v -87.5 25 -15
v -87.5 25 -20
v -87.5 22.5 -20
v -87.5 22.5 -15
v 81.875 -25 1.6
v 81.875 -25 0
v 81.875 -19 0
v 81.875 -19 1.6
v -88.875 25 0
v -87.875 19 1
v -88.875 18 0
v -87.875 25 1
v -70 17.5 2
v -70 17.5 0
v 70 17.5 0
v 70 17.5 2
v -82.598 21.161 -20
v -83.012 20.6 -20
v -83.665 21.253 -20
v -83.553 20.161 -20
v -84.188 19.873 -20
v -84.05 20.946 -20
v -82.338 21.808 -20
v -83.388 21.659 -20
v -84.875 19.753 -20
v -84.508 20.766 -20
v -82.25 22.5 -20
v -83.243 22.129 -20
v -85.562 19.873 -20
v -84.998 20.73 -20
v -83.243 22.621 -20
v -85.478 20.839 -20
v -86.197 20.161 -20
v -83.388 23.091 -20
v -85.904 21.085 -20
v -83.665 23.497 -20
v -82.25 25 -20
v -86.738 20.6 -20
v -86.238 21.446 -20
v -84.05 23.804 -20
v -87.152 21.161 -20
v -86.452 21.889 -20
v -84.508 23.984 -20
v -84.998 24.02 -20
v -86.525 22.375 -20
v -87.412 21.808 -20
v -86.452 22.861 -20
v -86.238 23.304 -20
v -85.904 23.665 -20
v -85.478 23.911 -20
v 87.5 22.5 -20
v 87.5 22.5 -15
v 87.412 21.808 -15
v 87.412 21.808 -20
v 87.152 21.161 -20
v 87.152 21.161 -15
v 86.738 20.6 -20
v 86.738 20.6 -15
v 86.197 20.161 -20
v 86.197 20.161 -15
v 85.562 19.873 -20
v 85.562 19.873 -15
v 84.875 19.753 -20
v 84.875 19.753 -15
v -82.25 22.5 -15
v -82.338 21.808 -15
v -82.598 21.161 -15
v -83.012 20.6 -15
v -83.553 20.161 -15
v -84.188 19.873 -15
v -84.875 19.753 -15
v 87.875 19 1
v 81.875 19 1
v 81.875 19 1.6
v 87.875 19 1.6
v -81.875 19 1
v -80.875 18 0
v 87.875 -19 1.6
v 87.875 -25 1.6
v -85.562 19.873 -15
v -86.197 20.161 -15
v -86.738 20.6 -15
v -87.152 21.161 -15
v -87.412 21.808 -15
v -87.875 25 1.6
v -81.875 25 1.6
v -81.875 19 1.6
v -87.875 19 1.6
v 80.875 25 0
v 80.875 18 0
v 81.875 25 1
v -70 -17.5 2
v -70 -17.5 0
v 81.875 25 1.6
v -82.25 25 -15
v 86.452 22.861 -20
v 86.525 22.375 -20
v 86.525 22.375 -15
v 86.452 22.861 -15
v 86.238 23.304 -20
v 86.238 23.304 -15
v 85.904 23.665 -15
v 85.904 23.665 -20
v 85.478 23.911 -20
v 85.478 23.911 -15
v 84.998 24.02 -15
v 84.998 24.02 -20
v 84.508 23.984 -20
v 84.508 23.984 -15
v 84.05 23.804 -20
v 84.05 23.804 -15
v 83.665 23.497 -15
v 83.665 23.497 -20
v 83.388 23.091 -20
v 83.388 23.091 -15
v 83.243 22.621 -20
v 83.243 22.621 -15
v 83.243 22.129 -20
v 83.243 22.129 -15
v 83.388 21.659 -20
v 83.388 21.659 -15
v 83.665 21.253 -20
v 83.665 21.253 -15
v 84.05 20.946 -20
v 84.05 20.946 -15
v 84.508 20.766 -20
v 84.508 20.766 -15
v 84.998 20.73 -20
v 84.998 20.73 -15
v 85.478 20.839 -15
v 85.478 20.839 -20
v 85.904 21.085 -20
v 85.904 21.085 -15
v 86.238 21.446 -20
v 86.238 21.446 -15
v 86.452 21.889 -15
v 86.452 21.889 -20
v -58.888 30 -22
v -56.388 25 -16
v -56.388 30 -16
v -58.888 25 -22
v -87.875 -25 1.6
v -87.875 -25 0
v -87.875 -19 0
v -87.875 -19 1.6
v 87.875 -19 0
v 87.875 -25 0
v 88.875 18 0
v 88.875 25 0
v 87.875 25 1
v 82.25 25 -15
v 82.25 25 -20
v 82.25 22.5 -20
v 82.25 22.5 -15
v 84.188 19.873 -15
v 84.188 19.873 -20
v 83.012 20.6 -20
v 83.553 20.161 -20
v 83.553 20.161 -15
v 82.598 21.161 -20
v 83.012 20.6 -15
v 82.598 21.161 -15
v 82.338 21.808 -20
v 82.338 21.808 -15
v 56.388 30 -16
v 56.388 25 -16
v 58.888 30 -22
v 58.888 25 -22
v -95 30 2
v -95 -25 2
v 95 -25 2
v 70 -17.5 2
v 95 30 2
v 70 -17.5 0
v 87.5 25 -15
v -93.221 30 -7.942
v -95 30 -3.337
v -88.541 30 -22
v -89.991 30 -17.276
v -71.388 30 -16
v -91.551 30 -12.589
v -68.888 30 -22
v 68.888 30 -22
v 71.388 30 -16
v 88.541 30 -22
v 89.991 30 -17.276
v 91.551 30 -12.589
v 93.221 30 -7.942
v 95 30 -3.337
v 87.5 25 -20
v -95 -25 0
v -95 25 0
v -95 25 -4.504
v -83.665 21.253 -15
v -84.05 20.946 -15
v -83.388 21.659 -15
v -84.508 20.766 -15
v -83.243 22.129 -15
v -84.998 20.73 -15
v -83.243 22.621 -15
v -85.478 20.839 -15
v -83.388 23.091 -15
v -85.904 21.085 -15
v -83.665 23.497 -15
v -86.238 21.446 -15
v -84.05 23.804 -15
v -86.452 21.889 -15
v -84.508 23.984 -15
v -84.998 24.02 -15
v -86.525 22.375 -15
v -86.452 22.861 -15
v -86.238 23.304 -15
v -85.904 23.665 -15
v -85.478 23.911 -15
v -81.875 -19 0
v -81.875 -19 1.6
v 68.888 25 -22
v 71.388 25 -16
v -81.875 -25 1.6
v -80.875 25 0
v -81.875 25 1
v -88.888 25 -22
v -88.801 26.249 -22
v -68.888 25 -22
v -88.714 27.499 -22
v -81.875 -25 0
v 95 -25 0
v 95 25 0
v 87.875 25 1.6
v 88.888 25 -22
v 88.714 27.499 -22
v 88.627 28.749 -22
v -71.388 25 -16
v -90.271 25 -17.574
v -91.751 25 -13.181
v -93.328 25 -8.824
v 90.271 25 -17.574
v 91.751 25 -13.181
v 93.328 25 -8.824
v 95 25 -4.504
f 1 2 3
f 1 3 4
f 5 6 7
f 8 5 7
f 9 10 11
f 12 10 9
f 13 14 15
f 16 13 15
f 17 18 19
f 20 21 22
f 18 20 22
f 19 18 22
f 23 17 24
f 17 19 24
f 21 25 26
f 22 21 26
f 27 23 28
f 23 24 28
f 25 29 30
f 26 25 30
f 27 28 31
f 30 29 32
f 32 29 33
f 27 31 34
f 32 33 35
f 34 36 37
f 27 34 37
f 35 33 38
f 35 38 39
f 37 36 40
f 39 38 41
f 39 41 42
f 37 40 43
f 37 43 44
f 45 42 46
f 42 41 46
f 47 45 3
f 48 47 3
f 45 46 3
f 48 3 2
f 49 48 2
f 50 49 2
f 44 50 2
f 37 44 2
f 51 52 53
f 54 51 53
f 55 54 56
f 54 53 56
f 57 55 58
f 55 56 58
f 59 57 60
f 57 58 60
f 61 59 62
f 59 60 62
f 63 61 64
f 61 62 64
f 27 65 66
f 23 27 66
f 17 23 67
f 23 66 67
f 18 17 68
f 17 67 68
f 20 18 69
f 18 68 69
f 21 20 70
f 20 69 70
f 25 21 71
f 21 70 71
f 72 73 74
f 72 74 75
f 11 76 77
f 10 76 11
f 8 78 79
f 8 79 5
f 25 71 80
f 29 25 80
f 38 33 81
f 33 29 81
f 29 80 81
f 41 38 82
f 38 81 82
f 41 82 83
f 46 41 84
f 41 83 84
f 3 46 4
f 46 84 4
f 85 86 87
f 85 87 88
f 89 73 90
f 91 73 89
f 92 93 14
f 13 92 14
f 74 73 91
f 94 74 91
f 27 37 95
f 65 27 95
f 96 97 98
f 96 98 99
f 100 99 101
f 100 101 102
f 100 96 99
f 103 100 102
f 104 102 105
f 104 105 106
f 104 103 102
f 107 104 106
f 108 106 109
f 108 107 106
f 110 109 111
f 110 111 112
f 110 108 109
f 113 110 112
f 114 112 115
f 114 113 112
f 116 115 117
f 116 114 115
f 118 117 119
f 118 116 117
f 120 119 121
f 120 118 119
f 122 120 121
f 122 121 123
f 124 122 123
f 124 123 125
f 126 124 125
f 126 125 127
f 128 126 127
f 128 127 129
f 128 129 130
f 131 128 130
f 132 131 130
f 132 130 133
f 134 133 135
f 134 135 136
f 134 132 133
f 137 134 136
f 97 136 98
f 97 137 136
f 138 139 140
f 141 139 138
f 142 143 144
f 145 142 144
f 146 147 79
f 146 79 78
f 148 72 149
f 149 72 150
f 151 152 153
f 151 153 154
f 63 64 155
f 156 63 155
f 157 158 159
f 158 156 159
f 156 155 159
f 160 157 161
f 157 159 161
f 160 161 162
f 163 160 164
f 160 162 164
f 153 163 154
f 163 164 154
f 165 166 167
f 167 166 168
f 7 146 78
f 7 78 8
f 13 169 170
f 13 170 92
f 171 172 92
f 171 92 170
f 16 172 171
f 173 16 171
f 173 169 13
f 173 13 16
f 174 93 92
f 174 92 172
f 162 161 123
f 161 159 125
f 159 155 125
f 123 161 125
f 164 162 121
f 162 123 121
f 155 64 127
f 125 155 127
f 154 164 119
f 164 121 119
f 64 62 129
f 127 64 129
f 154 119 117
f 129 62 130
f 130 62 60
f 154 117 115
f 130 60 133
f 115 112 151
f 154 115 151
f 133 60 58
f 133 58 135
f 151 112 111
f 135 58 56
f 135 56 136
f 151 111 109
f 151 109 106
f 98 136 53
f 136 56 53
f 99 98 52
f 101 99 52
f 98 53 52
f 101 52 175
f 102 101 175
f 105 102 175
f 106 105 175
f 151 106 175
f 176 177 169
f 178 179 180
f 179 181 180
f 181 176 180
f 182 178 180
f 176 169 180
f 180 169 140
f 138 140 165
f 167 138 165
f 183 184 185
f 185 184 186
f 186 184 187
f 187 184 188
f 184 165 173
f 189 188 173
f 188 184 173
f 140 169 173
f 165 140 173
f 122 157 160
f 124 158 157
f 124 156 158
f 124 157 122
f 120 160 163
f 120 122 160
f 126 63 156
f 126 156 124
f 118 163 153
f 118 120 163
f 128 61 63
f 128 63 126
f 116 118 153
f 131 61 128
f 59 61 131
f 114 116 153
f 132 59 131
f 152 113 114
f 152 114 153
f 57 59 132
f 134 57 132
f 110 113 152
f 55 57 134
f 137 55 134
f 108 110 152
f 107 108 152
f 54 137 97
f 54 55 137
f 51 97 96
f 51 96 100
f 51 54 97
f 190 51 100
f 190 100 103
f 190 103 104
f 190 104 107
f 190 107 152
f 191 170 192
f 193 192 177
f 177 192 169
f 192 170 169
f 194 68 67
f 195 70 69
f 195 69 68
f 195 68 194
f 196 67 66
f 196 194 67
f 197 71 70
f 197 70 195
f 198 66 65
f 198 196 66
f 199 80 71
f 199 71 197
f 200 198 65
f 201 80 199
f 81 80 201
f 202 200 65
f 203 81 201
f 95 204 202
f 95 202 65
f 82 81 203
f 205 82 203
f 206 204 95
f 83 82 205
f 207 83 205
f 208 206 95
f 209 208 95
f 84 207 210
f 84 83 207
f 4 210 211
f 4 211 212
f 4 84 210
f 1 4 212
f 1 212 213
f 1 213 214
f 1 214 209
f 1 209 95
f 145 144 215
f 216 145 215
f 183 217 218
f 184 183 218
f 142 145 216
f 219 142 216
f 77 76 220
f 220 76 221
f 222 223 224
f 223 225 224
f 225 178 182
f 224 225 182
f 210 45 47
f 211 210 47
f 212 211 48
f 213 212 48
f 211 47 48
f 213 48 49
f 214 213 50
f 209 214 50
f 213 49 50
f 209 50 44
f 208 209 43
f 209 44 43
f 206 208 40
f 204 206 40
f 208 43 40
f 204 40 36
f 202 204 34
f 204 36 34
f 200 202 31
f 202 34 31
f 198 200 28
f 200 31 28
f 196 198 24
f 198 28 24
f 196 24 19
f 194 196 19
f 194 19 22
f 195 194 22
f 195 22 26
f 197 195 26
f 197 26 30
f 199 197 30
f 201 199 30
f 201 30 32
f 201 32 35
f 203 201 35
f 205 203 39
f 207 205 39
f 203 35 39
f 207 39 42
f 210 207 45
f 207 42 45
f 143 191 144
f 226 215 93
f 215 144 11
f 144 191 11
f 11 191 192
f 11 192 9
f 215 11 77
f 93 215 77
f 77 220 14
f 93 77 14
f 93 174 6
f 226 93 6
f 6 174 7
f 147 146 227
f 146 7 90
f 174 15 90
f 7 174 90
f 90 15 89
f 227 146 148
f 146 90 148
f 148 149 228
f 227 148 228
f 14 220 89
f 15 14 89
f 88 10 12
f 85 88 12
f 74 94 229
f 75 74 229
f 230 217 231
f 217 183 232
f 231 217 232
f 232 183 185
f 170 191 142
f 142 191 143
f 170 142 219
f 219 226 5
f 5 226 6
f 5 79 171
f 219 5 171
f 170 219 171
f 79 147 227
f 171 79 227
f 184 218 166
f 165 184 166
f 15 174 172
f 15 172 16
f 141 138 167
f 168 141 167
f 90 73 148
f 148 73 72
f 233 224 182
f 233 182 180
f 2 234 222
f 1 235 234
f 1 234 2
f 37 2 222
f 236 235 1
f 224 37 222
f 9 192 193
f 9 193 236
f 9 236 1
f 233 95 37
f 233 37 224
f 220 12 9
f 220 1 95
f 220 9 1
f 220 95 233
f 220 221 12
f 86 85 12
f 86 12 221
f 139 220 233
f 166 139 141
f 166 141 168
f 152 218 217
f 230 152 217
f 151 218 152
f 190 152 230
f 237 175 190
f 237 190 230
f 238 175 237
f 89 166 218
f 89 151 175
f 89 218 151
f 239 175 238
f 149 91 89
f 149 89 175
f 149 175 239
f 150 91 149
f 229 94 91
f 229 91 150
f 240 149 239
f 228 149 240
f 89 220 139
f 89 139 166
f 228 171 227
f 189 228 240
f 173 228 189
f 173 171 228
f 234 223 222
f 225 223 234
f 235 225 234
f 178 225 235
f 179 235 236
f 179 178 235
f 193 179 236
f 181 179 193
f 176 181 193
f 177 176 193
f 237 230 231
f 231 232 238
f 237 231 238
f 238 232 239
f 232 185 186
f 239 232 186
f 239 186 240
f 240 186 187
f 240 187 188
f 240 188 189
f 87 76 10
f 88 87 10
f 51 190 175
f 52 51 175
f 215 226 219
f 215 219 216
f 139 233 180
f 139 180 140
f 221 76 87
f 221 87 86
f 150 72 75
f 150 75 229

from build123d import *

# Parameters (mm, degrees)
SKETCH1_W                = 190
SKETCH1_H                = 50
SKETCH1_W_2              = 140
SKETCH1_H_2              = 35
BOSS_EXTRUDE1_DEPTH      = 2
SKETCH3_W                = 190
SKETCH3_H                = 5
BOSS_EXTRUDE2_DEPTH      = 24
BOSS_EXTRUDE3_START      = -7.5
SKETCH6_W                = 5
SKETCH6_H                = 5.25
BOSS_EXTRUDE3_DEPTH      = 5.25
CUT_EXTRUDE1_DEPTH       = 108.905945309
SKETCH7_R                = 1.65
CUT_EXTRUDE2_DEPTH       = 5
FILLET1_R                = 2.75
FILLET1_OF_MIRROR3_R     = 2.75
CUT_EXTRUDE3_DEPTH       = 5
SKETCH10_W               = 6
SKETCH10_H               = 6
CUT_EXTRUDE4_DEPTH       = 1.6
CHAMFER1_SIZE            = 1
SKETCH12_W               = 6
SKETCH12_H               = 6
CUT_EXTRUDE5_DEPTH       = 1.6
CHAMFER1_OF_MIRROR5_SIZE = 1


with BuildPart() as part:
    # Sketch1 → Boss-Extrude1 (new body)
    with BuildSketch(Plane.XY):
        Rectangle(SKETCH1_W, SKETCH1_H)
        Rectangle(SKETCH1_W_2, SKETCH1_H_2, mode=Mode.SUBTRACT)
    extrude(amount=BOSS_EXTRUDE1_DEPTH)

    # Sketch3 → Boss-Extrude2 (add)
    with BuildSketch(Plane.XY.offset(2)):
        with Locations((0, 27.5)):
            Rectangle(SKETCH3_W, SKETCH3_H)
    extrude(amount=-BOSS_EXTRUDE2_DEPTH)

    # Sketch6 → Boss-Extrude3 (add)
    with BuildSketch(Plane.ZY.offset(95).offset(BOSS_EXTRUDE3_START)):
        with Locations((-17.5, 22.375)):
            Rectangle(SKETCH6_W, SKETCH6_H)
    boss_extrude3 = extrude(amount=-BOSS_EXTRUDE3_DEPTH)

    # Sketch5 → Cut-Extrude1 (cut, symmetric)
    with BuildSketch(Plane(origin=(0, 18.839521848, 4.396767931), x_dir=(1, 0, 0), z_dir=(0, 0.9738311486761368, 0.22727273014621918))):
        with BuildLine():
            Line((95, 28.242467175), (88.541117044, 28.242467175))
            ThreePointArc((88.541117044, 28.242467175), (91.551341518, 19.077417851), (95, 10.068181746))
            Line((95, 10.068181746), (95, 28.242467175))
        make_face()
    cut_extrude1 = extrude(amount=CUT_EXTRUDE1_DEPTH, both=True, mode=Mode.SUBTRACT)

    # Mirror1: Cut-Extrude1 across plane
    add(cut_extrude1.mirror(Plane(origin=(0, 0, 0), x_dir=(0, 0, 1), z_dir=(1, 0, 0))), mode=Mode.SUBTRACT)

    # Sketch7 → Cut-Extrude2 (cut)
    with BuildSketch(Plane(origin=(0, 0, -20), x_dir=(-1, 0, 0), z_dir=(0, 0, -1))):
        with Locations((84.875, 22.375)):
            Circle(SKETCH7_R)
    cut_extrude2 = extrude(amount=-CUT_EXTRUDE2_DEPTH, mode=Mode.SUBTRACT)

    # Fillet1
    # the kernel refuses this fillet: 2.75 mm, written as the material it takes off along each edge
    with BuildSketch(Plane(origin=(-87.5, 19.75, -8.125), x_dir=(0, 1, 0), z_dir=(0, 0, -1))) as fillet1_piece_1:
        with BuildLine():
            CenterArc((FILLET1_R, FILLET1_R), FILLET1_R, 180, 90)
            Line((0, FILLET1_R), (0, 0))
            Line((0, 0), (FILLET1_R, 0))
        make_face()
    extrude(amount=18.75, mode=Mode.SUBTRACT)
    with BuildSketch(Plane(origin=(-82.25, 19.75, -8.125), x_dir=(0, 1, 0), z_dir=(0, 0, -1))) as fillet1_piece_2:
        with BuildLine():
            CenterArc((FILLET1_R, -FILLET1_R), FILLET1_R, 90, 90)
            Line((0, -FILLET1_R), (0, 0))
            Line((0, 0), (FILLET1_R, 0))
        make_face()
    extrude(amount=18.75, mode=Mode.SUBTRACT)

    # Mirror3: Boss-Extrude3, Cut-Extrude2 across plane
    add(boss_extrude3.mirror(Plane(origin=(0, 0, 0), x_dir=(0, 0, 1), z_dir=(1, 0, 0))))
    add(cut_extrude2.mirror(Plane(origin=(0, 0, 0), x_dir=(0, 0, 1), z_dir=(1, 0, 0))), mode=Mode.SUBTRACT)

    # Fillet1 of Mirror3
    # the kernel refuses this fillet: 2.75 mm, written as the material it takes off along each edge
    with BuildSketch(Plane(origin=(87.5, 19.75, -8.125), x_dir=(0, 1, 0), z_dir=(0, 0, -1))) as fillet1_of_mirror3_piece_1:
        with BuildLine():
            CenterArc((FILLET1_OF_MIRROR3_R, -FILLET1_OF_MIRROR3_R), FILLET1_OF_MIRROR3_R, 90, 90)
            Line((0, -FILLET1_OF_MIRROR3_R), (0, 0))
            Line((0, 0), (FILLET1_OF_MIRROR3_R, 0))
        make_face()
    extrude(amount=18.75, mode=Mode.SUBTRACT)
    with BuildSketch(Plane(origin=(82.25, 19.75, -8.125), x_dir=(0, 1, 0), z_dir=(0, 0, -1))) as fillet1_of_mirror3_piece_2:
        with BuildLine():
            CenterArc((FILLET1_OF_MIRROR3_R, FILLET1_OF_MIRROR3_R), FILLET1_OF_MIRROR3_R, 180, 90)
            Line((0, FILLET1_OF_MIRROR3_R), (0, 0))
            Line((0, 0), (FILLET1_OF_MIRROR3_R, 0))
        make_face()
    extrude(amount=18.75, mode=Mode.SUBTRACT)

    # Sketch9 → Cut-Extrude3 (cut)
    with BuildSketch(Plane.XZ.offset(-25)):
        Polygon((-68.887905516, -22), (-71.387905516, -16), (-56.387905516, -16), (-58.887905516, -22), align=None)
    cut_extrude3 = extrude(amount=-CUT_EXTRUDE3_DEPTH, mode=Mode.SUBTRACT)

    # Mirror4: Cut-Extrude3 across plane
    add(cut_extrude3.mirror(Plane(origin=(0, 0, 0), x_dir=(0, 0, 1), z_dir=(1, 0, 0))), mode=Mode.SUBTRACT)

    # Sketch10 → Cut-Extrude4 (cut)
    with BuildSketch(Plane(origin=(0, 0, 0), x_dir=(-1, 0, 0), z_dir=(0, 0, -1))):
        with Locations((84.875, 22)):
            Rectangle(SKETCH10_W, SKETCH10_H)
    cut_extrude4 = extrude(amount=-CUT_EXTRUDE4_DEPTH, mode=Mode.SUBTRACT)

    # Chamfer1
    chamfer1_edges = [part.edges().sort_by_distance(p)[0] for p in [
        (-81.875, 22, 0),
        (-84.875, 19, 0),
        (-87.875, 22, 0),
    ]]
    chamfer(chamfer1_edges, length=CHAMFER1_SIZE)

    # Sketch12 → Cut-Extrude5 (cut)
    with BuildSketch(Plane(origin=(0, 0, 0), x_dir=(-1, 0, 0), z_dir=(0, 0, -1))):
        with Locations((-84.875, -22)):
            Rectangle(SKETCH12_W, SKETCH12_H)
    cut_extrude5 = extrude(amount=-CUT_EXTRUDE5_DEPTH, mode=Mode.SUBTRACT)

    # Mirror5: Cut-Extrude4, Cut-Extrude5 across plane
    add(cut_extrude4.mirror(Plane(origin=(0, 0, 0), x_dir=(0, 0, 1), z_dir=(1, 0, 0))), mode=Mode.SUBTRACT)
    add(cut_extrude5.mirror(Plane(origin=(0, 0, 0), x_dir=(0, 0, 1), z_dir=(1, 0, 0))), mode=Mode.SUBTRACT)

    # Chamfer1 of Mirror5
    chamfer1_of_mirror5_edges = [part.edges().sort_by_distance(p)[0] for p in [
        (81.875, 22, 0),
        (84.875, 19, 0),
        (87.875, 22, 0),
    ]]
    chamfer(chamfer1_of_mirror5_edges, length=CHAMFER1_OF_MIRROR5_SIZE)


solid = part.part
